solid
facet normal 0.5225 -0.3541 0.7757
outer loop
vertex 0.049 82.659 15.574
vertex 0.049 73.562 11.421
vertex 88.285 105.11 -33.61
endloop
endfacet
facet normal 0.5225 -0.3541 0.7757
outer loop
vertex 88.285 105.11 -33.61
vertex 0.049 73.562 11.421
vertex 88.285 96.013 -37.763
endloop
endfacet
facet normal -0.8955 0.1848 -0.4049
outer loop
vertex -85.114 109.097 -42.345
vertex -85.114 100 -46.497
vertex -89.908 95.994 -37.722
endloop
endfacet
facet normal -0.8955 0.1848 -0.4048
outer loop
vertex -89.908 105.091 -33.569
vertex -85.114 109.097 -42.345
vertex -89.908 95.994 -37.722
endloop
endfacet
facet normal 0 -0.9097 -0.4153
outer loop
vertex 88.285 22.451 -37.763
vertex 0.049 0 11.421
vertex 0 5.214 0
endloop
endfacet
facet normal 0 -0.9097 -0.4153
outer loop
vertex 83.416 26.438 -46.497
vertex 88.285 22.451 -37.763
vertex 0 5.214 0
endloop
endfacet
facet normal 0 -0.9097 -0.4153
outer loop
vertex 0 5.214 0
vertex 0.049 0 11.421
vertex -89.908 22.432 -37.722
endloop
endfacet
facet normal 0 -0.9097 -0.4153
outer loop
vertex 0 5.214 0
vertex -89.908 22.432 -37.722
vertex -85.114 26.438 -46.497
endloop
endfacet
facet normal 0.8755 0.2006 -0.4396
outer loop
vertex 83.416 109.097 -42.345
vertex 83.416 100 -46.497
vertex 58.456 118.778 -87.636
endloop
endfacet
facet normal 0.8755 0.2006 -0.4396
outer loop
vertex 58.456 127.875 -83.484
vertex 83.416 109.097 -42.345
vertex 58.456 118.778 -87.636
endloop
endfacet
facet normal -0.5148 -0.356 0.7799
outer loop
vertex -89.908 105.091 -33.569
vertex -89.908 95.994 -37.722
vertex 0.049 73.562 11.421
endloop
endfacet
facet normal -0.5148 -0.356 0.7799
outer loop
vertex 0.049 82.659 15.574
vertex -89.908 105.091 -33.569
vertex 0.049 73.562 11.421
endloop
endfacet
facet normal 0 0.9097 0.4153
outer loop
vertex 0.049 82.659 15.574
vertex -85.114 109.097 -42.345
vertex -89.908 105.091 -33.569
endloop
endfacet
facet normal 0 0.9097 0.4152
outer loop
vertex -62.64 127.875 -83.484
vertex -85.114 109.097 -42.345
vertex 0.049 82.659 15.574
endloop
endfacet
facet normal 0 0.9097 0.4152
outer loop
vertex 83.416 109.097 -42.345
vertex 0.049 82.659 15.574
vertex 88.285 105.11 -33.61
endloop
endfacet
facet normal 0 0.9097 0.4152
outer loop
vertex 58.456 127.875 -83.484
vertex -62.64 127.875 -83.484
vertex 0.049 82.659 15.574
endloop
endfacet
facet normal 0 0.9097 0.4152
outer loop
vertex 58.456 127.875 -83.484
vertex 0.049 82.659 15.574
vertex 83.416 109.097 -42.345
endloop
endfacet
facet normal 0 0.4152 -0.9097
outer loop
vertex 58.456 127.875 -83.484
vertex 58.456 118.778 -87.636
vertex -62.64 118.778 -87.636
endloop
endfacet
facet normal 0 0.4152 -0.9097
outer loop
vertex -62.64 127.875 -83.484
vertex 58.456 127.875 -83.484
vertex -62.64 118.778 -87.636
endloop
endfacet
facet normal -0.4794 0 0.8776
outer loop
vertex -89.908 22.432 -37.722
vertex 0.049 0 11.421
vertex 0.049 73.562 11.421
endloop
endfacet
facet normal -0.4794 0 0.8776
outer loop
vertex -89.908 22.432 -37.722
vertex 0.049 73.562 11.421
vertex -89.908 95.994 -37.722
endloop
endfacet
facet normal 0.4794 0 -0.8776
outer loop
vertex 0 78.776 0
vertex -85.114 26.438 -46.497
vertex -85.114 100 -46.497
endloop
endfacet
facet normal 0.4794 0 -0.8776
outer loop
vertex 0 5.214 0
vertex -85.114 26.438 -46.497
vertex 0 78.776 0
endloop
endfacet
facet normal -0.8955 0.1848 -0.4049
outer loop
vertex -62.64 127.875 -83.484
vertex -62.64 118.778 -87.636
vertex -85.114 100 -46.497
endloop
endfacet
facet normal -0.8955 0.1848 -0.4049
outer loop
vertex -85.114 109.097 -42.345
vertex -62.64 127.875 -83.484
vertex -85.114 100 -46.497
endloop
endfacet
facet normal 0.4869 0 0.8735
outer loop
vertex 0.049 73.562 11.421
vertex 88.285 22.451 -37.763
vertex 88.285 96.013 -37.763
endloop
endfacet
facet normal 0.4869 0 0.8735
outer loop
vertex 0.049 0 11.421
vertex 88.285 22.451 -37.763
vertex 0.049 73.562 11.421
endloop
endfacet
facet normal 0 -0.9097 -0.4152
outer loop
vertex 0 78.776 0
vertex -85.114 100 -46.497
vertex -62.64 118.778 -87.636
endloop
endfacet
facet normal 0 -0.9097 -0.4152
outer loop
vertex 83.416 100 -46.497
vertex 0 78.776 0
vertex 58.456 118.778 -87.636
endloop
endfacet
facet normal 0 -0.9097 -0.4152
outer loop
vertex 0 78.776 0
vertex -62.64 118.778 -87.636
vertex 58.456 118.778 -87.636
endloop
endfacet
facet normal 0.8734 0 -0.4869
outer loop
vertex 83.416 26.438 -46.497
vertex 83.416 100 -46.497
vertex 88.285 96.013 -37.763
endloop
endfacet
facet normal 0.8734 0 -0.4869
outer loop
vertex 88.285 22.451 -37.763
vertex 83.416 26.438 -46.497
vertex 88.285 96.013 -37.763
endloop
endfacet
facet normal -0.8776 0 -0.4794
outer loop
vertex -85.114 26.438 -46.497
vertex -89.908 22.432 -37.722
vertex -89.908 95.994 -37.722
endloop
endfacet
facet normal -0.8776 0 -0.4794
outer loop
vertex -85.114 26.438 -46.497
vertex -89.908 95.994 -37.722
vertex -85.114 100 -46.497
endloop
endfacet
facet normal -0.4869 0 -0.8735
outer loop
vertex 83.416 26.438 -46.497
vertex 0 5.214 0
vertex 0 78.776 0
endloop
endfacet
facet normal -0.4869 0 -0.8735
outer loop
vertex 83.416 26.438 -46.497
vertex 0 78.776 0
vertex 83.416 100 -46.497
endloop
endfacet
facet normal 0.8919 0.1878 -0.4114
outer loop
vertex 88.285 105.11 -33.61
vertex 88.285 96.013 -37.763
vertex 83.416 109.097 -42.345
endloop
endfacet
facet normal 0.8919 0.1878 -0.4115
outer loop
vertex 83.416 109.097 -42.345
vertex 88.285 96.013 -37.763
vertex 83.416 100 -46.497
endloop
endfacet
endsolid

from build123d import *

# Parameters (mm, degrees)
EXTRUDE_2_DEPTH          = 100
CUT_EXTRUDE_1_DEPTH      = 143.286557619
CUT_EXTRUDE_1_DEPTH_BACK = 143.286557619
EXTRUDE_3_DEPTH          = 10


with BuildPart() as part:
    # 草图5 → 拉伸-薄壁2 (new body)
    with BuildSketch(Plane(origin=(0, 0, 0), x_dir=(1, 0, 0), z_dir=(0, 1, 0))):
        Polygon((-85.11384198, 46.497376637), (0, 0), (83.416414932, 46.497376637), (88.285235684, 37.762699512), (0.048663646, -11.421494349), (-89.908055505, 37.72152815), align=None)
    extrude(amount=EXTRUDE_2_DEPTH)

    # 草图6 → 切除-拉伸1 (cut, two sides: drawn at the far end of the back side and taken through both)
    with BuildSketch(Plane(origin=(0, 0, 0), x_dir=(0, 0, -1), z_dir=(1, 0, 0)).offset(-CUT_EXTRUDE_1_DEPTH_BACK)):
        Polygon((-11.421494349, 0), (46.497376637, 26.437958822), (46.497376637, 0), align=None)
        Polygon((46.497376637, 100), (-11.421494349, 73.562041178), (-11.421494349, 100), align=None)
    extrude(amount=CUT_EXTRUDE_1_DEPTH + CUT_EXTRUDE_1_DEPTH_BACK, mode=Mode.SUBTRACT)

    # 草图7 → 凸台-拉伸3 (add)
    with BuildSketch(Plane(origin=(0, 65.192092202, 29.757932429), x_dir=(1, 0, 0), z_dir=(0, 0.909707375853676, 0.4152499130853836))):
        Polygon((88.285235684, 74.222363952), (83.416414932, 83.823997793), (58.456022425, 129.045976045), (-62.639885843, 129.045976045), (-85.11384198, 83.823997793), (-89.908055505, 74.177106144), (0.048663646, 20.156413552), align=None)
    extrude(amount=EXTRUDE_3_DEPTH)


solid = part.part
